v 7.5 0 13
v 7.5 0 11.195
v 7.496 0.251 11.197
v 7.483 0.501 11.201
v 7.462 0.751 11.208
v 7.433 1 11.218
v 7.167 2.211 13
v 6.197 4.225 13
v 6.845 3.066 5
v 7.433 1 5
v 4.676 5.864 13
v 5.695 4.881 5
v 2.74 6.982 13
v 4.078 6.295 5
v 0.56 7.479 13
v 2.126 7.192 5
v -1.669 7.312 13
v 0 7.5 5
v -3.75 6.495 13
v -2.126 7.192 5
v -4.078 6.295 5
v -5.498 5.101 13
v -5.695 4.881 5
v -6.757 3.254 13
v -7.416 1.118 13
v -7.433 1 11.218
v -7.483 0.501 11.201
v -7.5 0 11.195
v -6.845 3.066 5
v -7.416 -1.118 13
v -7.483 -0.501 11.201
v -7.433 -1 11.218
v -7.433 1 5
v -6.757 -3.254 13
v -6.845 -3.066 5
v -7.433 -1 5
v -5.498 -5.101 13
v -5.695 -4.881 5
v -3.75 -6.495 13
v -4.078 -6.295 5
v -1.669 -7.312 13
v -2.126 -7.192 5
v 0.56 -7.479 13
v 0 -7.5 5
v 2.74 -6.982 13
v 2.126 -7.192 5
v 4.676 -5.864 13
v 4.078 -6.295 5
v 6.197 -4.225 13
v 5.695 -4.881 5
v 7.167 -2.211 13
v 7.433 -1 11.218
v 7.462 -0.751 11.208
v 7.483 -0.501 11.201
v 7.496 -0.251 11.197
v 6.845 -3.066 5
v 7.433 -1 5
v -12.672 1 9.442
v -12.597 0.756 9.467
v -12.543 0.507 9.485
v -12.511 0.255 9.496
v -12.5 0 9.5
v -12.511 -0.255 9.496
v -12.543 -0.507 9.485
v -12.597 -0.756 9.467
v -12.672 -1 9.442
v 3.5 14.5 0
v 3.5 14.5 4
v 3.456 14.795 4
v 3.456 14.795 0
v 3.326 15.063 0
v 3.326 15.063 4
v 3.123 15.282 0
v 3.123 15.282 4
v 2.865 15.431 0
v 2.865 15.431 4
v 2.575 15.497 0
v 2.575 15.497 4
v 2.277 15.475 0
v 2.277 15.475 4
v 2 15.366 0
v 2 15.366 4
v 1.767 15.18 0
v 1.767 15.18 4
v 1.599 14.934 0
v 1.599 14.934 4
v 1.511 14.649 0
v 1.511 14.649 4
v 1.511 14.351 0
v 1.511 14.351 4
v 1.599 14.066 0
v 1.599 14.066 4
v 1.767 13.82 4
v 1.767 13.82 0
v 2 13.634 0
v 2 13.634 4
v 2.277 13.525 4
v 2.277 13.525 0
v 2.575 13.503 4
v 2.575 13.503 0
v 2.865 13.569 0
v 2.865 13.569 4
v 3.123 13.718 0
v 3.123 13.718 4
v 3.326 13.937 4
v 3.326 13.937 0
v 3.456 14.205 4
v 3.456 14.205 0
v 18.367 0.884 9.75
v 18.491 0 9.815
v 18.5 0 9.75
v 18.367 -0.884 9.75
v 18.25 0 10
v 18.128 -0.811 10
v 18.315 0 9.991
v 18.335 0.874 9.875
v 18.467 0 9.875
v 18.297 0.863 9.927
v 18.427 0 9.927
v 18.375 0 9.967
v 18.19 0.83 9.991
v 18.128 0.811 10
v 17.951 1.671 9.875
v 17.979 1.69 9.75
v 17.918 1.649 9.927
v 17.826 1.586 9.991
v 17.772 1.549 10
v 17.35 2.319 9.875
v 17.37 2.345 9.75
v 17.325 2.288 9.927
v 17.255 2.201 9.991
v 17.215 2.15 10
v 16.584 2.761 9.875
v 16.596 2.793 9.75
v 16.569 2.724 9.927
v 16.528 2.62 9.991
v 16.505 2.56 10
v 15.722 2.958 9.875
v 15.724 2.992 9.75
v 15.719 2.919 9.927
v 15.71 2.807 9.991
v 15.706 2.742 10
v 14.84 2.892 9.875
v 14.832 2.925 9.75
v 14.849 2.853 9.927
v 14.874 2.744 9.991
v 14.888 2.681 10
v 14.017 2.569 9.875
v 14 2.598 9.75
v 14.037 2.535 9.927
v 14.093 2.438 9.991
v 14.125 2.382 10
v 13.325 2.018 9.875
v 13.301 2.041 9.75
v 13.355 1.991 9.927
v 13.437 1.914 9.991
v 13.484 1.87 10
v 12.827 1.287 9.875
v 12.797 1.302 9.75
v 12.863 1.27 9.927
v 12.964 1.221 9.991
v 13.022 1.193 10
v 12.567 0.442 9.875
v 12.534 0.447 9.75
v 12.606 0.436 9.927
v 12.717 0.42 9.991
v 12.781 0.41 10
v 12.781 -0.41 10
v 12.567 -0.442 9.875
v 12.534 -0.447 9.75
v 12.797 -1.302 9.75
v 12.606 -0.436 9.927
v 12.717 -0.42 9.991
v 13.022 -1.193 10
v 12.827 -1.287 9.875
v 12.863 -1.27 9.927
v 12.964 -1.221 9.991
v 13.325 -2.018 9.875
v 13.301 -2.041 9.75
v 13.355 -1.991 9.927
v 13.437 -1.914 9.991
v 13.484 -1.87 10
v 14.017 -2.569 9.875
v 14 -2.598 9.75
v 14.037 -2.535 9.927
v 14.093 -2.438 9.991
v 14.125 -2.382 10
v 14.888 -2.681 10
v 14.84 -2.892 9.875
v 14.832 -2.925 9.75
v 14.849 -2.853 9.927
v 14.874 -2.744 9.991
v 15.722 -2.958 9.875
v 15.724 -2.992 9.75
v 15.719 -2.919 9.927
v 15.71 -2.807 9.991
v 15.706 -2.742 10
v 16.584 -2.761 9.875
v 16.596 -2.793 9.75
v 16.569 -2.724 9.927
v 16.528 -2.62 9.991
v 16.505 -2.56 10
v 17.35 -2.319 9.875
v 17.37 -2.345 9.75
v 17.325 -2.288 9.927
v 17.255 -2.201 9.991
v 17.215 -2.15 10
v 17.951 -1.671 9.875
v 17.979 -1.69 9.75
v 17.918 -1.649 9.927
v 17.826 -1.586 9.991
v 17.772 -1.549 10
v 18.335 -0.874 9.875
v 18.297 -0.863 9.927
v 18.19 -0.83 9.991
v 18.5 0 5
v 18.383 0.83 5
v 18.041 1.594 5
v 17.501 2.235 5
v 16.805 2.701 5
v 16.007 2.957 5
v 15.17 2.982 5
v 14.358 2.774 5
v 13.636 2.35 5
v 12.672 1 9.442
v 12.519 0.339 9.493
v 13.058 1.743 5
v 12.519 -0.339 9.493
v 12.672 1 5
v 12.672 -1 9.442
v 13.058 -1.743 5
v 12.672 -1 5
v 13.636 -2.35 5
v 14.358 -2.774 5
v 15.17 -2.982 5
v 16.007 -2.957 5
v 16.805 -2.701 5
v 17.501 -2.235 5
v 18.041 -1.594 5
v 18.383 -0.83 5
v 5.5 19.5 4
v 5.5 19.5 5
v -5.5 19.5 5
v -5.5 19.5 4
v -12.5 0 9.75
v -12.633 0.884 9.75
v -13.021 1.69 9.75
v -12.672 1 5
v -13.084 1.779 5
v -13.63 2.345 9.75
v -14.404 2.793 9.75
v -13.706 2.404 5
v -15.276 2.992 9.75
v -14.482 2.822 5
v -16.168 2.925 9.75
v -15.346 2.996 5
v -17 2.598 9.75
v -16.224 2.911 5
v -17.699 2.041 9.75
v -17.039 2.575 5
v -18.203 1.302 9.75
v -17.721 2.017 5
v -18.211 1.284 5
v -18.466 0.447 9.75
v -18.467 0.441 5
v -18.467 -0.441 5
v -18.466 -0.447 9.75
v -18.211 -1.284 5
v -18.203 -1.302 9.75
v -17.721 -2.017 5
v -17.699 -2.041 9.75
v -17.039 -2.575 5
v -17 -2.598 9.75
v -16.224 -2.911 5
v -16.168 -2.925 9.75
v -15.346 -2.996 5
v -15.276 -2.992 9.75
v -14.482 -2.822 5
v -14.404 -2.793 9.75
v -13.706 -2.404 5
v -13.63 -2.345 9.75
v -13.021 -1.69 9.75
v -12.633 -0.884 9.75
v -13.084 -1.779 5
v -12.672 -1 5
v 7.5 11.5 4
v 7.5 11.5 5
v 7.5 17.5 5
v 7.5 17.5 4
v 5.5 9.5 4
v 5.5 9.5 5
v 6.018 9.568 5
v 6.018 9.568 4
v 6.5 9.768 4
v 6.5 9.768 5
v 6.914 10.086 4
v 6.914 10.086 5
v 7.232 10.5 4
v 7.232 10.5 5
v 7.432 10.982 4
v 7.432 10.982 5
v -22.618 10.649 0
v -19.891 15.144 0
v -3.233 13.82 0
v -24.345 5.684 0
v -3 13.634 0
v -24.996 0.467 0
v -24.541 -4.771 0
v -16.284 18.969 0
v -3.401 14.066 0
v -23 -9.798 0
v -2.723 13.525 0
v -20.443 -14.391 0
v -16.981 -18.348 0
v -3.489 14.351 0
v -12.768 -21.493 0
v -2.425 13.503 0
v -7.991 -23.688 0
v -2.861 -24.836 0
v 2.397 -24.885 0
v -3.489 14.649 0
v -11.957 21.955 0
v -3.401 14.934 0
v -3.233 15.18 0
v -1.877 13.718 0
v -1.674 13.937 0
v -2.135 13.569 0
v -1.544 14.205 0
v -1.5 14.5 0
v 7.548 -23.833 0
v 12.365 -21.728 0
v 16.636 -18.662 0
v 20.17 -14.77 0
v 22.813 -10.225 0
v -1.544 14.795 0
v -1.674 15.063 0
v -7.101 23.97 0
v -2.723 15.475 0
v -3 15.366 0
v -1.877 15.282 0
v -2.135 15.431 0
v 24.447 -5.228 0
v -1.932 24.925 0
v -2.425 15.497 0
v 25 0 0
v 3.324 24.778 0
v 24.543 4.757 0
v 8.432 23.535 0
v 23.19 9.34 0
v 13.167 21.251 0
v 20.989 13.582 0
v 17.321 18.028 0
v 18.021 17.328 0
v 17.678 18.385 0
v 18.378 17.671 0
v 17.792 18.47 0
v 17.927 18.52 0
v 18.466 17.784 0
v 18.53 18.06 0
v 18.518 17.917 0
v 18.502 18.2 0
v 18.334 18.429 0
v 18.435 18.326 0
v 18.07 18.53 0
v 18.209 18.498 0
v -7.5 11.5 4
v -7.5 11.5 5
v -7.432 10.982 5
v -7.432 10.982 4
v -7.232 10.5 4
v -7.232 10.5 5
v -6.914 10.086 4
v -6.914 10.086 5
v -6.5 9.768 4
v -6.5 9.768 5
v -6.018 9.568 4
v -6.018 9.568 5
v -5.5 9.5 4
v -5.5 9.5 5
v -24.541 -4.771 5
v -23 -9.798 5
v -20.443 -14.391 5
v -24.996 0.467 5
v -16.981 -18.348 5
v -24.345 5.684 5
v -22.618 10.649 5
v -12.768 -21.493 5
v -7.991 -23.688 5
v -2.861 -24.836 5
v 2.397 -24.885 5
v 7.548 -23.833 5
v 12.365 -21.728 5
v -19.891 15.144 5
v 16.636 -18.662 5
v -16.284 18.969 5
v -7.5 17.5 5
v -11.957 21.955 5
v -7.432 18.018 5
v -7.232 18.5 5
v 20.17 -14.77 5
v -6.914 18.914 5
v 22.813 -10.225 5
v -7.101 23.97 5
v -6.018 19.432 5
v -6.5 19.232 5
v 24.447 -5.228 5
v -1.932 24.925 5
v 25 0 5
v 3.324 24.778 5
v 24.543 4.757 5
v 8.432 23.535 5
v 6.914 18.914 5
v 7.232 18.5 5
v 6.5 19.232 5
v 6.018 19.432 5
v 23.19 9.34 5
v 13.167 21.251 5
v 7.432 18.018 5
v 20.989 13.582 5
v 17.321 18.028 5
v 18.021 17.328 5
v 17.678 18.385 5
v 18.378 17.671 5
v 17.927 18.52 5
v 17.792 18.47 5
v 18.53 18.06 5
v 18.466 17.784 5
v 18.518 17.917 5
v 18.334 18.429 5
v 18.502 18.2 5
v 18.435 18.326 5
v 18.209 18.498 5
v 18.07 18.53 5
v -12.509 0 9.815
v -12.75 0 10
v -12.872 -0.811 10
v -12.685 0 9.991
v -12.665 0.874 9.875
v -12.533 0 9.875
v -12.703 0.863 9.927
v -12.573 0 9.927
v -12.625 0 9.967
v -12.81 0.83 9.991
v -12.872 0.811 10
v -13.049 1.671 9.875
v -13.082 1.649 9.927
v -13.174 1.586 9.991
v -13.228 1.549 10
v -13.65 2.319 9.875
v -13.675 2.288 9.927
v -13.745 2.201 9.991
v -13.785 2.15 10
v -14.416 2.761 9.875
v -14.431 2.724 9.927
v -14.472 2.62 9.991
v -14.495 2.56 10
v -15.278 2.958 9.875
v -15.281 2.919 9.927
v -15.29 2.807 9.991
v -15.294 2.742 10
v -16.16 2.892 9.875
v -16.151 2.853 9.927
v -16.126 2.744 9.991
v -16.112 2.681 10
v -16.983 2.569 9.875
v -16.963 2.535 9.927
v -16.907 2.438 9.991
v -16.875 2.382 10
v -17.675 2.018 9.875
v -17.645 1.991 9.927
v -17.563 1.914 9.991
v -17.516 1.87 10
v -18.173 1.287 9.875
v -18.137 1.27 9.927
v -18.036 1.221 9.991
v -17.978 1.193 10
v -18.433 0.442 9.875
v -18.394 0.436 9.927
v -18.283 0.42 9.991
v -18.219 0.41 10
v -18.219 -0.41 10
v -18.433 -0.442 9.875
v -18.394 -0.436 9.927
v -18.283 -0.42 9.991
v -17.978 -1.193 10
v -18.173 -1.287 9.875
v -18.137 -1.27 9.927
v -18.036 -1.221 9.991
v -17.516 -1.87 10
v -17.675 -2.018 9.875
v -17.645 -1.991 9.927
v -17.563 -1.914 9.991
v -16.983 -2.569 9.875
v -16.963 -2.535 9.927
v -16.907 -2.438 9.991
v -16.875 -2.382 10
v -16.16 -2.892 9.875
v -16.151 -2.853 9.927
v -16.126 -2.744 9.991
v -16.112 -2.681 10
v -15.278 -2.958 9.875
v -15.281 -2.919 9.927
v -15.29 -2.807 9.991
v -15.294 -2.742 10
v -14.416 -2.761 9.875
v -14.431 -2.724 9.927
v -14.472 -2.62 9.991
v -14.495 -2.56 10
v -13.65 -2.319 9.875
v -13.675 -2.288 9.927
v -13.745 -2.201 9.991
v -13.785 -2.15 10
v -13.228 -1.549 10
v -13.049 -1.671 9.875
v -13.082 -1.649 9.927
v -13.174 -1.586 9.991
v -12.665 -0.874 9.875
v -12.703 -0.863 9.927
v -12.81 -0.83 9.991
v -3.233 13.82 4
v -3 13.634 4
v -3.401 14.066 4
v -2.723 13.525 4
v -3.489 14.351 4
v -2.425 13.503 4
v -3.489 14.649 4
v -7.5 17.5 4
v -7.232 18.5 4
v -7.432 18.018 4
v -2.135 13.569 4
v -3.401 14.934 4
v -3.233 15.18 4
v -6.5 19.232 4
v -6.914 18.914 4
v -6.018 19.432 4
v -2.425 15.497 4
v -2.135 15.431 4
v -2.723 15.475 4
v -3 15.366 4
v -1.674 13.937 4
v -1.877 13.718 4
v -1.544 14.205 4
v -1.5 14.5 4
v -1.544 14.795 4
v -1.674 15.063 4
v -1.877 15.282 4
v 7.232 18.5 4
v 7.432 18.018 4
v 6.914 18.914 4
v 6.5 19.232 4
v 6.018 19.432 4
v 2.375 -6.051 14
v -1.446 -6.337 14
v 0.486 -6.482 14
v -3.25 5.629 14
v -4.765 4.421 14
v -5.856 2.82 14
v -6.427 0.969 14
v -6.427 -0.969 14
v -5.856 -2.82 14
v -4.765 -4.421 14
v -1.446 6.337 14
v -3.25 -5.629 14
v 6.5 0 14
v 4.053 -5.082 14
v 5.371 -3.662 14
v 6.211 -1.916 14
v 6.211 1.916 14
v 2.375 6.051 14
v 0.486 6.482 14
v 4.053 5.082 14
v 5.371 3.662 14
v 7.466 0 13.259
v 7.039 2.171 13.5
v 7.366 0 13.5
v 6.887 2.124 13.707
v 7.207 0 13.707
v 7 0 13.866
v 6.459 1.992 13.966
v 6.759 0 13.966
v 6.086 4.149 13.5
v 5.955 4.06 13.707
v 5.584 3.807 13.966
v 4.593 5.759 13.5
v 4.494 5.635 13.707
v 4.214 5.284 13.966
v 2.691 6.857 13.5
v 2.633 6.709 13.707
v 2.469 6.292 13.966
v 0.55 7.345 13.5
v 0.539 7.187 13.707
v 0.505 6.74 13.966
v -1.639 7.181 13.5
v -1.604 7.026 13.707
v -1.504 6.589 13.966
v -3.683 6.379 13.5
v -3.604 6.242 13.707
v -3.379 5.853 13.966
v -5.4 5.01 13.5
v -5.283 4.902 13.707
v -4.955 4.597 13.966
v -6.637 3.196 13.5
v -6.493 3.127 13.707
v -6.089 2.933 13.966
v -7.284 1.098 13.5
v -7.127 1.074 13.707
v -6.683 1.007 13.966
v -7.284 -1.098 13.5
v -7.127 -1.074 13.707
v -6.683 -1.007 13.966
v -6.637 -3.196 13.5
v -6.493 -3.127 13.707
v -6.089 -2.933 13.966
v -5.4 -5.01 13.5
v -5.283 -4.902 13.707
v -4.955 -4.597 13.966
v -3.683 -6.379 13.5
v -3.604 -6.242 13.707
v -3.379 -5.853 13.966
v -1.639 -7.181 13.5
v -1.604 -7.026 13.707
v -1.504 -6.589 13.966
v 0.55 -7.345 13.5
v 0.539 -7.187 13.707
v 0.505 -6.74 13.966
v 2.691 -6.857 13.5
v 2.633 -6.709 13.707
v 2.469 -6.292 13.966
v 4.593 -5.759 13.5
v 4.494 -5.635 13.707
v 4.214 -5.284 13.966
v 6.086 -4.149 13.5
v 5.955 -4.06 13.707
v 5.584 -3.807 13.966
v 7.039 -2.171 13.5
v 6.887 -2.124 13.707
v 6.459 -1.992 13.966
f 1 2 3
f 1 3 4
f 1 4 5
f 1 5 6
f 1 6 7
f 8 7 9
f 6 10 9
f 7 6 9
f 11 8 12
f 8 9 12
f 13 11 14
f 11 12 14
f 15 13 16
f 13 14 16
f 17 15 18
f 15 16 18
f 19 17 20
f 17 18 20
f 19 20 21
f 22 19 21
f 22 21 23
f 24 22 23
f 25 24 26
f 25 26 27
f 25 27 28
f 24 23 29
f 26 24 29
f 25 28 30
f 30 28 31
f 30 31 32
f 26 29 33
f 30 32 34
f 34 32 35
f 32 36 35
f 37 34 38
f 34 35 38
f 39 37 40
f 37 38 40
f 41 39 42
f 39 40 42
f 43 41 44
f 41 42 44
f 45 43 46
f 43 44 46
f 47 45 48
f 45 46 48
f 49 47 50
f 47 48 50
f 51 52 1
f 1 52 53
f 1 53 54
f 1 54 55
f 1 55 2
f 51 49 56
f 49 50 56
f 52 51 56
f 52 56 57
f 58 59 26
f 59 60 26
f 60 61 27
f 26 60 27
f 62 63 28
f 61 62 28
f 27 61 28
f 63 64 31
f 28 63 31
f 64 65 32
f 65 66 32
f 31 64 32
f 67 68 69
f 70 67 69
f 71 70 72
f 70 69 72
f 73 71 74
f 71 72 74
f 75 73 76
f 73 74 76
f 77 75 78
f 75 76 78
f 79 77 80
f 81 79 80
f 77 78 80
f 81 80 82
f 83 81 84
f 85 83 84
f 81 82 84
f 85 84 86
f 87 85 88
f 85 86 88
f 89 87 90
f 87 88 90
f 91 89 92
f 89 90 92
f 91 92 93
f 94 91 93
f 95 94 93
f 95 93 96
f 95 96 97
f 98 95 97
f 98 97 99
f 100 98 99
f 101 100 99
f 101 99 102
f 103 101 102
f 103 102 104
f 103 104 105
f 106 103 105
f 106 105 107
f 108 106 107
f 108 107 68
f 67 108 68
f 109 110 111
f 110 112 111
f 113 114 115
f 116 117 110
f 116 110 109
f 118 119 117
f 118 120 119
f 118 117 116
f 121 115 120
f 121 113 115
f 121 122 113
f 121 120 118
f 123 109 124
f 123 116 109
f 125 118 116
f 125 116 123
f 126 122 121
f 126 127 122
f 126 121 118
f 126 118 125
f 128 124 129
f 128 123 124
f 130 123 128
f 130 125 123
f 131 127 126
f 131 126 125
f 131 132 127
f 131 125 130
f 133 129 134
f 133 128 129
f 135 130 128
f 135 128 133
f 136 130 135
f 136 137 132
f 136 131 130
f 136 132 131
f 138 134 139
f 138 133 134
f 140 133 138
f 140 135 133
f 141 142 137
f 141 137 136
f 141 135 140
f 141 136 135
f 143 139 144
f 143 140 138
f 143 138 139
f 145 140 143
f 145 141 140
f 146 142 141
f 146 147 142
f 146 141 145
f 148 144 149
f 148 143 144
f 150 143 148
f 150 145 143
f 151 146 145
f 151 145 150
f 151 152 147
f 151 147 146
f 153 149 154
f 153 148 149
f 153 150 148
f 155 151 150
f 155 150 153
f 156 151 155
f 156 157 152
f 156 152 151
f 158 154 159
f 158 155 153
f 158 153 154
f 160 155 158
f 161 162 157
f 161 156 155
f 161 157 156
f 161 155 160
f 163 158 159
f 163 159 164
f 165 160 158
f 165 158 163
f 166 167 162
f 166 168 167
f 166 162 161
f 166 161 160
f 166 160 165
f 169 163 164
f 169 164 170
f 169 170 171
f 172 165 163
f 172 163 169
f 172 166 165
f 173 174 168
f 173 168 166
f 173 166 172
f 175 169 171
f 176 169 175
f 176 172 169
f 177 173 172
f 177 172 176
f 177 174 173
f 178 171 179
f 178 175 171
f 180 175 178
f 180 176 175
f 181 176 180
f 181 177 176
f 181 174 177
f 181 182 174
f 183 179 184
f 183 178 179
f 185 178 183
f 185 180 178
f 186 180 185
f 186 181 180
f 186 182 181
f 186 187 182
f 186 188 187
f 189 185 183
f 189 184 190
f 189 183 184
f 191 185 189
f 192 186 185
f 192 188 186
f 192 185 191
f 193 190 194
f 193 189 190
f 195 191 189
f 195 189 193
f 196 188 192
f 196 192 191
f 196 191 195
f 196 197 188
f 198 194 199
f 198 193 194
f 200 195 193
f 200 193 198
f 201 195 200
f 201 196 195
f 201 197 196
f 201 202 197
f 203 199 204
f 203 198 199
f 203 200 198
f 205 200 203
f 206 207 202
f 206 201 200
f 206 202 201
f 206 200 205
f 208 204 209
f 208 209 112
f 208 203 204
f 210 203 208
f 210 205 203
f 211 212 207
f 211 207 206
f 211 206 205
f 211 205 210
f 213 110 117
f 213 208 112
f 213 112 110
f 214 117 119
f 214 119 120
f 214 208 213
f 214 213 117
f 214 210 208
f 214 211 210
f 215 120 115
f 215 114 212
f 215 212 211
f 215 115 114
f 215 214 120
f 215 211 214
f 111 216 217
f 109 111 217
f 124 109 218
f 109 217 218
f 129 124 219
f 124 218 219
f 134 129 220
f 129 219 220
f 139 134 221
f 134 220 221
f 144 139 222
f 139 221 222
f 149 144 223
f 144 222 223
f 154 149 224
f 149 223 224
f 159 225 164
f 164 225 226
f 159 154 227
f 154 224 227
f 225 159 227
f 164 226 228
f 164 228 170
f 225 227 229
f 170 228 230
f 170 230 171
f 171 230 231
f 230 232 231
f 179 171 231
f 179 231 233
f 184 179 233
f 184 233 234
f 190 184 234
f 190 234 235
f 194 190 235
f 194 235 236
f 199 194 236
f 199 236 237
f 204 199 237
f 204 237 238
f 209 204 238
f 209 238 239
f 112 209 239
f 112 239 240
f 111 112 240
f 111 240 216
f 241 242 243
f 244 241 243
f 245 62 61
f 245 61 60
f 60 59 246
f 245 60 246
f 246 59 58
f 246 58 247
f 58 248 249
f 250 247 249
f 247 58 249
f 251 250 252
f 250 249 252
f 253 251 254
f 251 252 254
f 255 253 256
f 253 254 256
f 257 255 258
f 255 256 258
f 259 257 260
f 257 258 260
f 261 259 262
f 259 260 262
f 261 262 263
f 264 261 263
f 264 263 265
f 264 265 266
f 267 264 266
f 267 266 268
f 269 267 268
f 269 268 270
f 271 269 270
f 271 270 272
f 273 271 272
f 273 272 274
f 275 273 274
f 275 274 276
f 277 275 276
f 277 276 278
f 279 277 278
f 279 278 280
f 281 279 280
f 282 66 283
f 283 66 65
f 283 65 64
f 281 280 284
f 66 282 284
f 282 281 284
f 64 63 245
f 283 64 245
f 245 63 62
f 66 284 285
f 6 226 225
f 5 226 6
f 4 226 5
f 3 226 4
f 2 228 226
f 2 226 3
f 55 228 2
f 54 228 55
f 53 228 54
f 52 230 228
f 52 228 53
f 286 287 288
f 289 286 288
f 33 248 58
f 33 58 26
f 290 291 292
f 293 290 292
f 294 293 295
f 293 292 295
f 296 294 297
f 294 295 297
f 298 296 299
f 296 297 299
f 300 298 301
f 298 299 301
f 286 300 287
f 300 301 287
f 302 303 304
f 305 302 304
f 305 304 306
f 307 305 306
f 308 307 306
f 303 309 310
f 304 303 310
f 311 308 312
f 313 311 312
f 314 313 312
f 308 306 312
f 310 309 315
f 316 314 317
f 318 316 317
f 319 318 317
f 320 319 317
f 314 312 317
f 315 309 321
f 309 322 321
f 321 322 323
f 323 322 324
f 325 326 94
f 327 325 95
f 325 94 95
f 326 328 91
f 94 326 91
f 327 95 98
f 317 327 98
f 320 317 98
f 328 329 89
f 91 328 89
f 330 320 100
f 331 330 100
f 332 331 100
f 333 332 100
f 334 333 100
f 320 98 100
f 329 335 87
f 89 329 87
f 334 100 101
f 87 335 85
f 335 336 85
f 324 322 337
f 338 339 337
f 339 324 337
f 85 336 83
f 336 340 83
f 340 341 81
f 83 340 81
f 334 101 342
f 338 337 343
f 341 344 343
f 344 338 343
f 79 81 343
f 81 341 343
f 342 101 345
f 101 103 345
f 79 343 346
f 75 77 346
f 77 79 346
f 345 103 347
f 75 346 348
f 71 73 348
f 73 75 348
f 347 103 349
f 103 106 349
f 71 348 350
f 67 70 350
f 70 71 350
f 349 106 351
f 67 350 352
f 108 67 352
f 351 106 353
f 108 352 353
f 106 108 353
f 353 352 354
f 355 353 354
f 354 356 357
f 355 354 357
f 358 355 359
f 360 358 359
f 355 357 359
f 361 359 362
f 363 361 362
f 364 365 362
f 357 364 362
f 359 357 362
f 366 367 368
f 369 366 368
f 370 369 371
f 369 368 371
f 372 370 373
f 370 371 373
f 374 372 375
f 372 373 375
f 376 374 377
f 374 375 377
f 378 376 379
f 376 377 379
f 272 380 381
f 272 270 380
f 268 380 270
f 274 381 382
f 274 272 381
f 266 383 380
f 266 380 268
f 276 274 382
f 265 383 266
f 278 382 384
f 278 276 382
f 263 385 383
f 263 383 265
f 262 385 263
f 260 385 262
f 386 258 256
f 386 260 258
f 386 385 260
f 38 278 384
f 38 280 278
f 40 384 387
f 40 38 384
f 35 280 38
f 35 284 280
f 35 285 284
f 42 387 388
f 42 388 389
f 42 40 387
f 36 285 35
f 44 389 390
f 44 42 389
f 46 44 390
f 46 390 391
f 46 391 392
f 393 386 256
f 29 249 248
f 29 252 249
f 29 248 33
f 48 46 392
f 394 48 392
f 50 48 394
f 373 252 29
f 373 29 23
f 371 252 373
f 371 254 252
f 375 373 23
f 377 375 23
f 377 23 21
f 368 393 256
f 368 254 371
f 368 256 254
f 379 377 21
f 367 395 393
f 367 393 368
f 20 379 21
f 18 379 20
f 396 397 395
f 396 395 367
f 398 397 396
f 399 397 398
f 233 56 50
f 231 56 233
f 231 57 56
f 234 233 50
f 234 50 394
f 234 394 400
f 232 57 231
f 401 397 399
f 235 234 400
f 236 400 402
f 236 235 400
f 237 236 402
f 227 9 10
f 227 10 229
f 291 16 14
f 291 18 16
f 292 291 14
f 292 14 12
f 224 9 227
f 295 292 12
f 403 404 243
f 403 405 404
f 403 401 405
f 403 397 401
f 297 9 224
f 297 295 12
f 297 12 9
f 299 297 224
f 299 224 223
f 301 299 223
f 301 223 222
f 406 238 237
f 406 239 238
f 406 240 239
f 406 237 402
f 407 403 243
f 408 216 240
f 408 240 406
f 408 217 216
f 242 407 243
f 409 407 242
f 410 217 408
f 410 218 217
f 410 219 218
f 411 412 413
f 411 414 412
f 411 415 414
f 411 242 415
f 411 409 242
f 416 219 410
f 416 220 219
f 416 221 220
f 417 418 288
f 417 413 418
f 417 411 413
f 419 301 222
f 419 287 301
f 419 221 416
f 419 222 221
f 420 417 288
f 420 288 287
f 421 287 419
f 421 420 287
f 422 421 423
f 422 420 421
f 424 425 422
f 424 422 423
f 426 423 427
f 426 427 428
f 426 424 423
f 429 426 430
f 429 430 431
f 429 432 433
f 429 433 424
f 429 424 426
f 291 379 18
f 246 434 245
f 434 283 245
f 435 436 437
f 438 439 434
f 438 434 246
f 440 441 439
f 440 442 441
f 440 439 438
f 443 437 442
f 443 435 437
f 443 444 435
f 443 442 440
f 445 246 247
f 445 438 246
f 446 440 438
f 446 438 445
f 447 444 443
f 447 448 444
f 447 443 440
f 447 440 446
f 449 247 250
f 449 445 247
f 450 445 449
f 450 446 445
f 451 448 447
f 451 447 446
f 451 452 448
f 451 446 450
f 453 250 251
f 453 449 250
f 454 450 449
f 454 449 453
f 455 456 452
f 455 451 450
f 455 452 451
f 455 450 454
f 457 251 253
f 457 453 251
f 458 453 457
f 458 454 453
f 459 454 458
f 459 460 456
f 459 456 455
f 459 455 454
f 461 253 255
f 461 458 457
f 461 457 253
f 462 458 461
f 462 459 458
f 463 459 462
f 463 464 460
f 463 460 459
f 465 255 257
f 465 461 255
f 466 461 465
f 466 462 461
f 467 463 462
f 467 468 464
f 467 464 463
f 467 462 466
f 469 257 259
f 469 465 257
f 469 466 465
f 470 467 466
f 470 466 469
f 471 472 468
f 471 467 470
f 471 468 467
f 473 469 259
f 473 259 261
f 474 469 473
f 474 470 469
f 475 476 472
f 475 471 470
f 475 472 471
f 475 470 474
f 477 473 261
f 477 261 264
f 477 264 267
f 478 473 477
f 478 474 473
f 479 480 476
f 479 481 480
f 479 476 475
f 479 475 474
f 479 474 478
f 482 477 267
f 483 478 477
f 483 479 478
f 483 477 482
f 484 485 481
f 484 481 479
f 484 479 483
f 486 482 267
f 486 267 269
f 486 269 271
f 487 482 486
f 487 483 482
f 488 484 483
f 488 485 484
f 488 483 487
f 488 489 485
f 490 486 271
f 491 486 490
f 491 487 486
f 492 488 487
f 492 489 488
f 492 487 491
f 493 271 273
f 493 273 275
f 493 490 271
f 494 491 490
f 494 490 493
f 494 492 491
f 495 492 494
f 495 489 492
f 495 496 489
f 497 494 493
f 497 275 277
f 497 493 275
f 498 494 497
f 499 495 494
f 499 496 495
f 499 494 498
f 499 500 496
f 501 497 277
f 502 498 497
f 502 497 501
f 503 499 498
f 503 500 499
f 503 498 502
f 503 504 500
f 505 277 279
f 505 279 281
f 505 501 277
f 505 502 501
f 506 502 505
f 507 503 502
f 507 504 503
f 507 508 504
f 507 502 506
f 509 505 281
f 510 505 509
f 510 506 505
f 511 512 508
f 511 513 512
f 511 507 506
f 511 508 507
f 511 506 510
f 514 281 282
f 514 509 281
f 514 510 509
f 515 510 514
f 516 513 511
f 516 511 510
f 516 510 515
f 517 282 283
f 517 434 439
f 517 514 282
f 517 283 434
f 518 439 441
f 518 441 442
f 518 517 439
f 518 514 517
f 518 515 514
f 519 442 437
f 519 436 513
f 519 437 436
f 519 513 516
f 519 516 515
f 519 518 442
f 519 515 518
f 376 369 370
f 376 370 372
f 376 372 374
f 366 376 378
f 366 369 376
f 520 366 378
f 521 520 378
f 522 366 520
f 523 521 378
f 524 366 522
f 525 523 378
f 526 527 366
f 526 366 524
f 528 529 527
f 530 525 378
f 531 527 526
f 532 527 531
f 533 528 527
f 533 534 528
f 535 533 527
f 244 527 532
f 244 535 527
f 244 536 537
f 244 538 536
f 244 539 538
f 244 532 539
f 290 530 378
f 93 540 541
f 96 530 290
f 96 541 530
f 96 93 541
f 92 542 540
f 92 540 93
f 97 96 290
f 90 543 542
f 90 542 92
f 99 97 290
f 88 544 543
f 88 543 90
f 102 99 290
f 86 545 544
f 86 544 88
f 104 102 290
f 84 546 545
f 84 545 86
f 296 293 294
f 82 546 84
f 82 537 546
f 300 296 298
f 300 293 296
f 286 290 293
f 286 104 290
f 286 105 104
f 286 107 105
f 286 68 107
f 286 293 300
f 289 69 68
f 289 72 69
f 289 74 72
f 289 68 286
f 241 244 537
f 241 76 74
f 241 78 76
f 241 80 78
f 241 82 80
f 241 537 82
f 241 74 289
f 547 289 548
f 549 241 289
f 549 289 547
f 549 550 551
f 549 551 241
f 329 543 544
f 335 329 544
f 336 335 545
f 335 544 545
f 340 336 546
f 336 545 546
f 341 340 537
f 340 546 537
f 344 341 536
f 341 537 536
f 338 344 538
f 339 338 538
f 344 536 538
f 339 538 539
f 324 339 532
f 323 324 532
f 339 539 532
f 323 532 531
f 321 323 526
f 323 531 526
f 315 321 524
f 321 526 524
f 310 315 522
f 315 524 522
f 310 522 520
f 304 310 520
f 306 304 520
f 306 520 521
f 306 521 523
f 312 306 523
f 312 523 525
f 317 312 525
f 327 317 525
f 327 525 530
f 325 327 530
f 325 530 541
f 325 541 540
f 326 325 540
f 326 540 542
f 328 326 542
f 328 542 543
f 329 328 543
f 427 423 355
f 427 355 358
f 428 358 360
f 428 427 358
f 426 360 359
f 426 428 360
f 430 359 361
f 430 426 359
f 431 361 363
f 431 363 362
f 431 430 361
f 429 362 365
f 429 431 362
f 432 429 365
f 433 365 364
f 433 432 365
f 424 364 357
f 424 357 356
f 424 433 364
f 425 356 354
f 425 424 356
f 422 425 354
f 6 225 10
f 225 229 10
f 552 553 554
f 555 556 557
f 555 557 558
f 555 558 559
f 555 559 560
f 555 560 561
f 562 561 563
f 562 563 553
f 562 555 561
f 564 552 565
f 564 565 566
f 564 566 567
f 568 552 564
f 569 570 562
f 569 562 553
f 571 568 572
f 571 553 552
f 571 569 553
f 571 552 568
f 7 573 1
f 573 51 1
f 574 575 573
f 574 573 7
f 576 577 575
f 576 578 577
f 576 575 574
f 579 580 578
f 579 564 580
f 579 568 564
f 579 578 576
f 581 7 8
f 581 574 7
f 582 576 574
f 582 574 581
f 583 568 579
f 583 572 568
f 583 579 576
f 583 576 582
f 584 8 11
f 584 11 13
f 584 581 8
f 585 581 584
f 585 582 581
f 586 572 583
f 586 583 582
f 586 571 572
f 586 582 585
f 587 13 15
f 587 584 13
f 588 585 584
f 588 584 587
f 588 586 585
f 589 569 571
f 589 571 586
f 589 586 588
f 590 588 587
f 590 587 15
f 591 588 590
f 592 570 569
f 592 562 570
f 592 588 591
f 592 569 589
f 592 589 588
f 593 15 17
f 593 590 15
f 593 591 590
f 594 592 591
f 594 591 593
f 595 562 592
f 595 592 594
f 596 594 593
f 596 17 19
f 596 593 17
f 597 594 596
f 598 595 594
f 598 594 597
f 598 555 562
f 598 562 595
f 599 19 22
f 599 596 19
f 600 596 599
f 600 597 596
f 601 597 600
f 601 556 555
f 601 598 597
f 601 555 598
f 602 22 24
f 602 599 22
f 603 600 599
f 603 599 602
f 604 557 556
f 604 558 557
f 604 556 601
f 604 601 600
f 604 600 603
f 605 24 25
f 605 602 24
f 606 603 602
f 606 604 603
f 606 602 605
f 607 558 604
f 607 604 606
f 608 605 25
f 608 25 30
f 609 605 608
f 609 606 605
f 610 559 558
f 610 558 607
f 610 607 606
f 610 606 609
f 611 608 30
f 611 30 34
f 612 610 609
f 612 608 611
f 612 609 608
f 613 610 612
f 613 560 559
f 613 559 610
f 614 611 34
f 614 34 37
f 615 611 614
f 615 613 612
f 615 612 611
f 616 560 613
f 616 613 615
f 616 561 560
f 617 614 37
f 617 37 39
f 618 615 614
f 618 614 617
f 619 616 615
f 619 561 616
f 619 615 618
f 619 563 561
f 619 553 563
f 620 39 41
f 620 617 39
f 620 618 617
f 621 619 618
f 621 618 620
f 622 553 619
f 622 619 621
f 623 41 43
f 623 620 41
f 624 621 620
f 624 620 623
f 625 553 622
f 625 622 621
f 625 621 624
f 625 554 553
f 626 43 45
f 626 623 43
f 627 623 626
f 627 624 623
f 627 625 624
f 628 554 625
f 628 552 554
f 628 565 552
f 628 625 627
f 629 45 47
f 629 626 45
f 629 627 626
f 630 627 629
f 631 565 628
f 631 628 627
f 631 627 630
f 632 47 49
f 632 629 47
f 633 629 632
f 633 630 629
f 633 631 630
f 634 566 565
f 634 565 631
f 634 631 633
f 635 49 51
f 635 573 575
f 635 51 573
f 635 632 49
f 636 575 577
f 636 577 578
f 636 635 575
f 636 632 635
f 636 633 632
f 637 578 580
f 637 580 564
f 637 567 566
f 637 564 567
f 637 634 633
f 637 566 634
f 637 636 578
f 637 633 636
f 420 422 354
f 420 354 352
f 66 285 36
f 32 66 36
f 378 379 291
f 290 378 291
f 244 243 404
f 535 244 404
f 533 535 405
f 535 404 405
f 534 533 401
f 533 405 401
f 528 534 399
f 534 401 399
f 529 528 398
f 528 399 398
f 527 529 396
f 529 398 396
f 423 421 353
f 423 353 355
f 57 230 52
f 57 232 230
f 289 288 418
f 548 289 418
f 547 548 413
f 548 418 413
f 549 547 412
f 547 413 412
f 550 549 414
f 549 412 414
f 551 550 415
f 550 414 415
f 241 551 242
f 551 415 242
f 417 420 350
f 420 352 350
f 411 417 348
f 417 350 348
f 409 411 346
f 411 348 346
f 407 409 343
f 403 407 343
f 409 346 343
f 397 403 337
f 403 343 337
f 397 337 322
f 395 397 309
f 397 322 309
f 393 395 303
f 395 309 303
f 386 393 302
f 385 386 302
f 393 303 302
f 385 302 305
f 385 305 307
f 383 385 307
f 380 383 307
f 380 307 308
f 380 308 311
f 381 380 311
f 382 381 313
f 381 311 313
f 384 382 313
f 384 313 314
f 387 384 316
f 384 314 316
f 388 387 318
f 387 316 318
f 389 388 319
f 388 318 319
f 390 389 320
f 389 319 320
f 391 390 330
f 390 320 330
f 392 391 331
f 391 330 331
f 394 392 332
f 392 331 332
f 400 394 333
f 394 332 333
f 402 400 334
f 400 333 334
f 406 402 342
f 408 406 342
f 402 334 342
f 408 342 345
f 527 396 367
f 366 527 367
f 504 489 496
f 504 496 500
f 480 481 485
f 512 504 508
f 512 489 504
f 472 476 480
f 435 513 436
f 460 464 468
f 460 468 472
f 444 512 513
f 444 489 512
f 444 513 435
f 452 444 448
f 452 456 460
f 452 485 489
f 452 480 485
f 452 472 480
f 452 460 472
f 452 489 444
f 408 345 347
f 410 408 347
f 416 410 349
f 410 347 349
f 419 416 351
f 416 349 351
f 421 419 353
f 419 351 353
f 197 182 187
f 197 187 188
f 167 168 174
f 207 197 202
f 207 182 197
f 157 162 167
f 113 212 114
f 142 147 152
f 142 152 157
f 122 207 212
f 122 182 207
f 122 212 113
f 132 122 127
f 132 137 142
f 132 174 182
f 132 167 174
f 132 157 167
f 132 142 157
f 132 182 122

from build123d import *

# Parameters (mm, degrees)
SKETCH_1_R           = 25
EXTRUDE_1_DEPTH      = 5
SKETCH_2_R           = 7.5
EXTRUDE_2_DEPTH      = 9
SKETCH_3_R           = 3
EXTRUDE_3_DEPTH      = 5
FILLET_1_R           = 1
EXTRUDE_4_DEPTH      = 1
EXTRUDE_4_DEPTH_BACK = 1
FILLET_2_R           = 0.25
EXTRUDE_5_DEPTH      = 5
CUT_EXTRUDE_1_DEPTH  = 1
SKETCH_7_R           = 1
CUT_EXTRUDE_2_DEPTH  = 21


with BuildPart() as part:
    # Эскиз1 → Бобышка-Вытянуть1 (new body)
    with BuildSketch(Plane.XY):
        Circle(SKETCH_1_R)
    extrude(amount=EXTRUDE_1_DEPTH)

    # Эскиз2 → Бобышка-Вытянуть2 (add)
    with BuildSketch(Plane.XY.offset(5)):
        Circle(SKETCH_2_R)
    extrude(amount=EXTRUDE_2_DEPTH)

    # Эскиз3 → Бобышка-Вытянуть3 (add)
    with BuildSketch(Plane.XY.offset(5)):
        with Locations((15.5, 0)):
            Circle(SKETCH_3_R)
        with Locations((-15.5, 0)):
            Circle(SKETCH_3_R)
    extrude(amount=EXTRUDE_3_DEPTH)

    # Скругление1
    fillet_1_edges = [part.edges().sort_by_distance(p)[0] for p in [
        (-7.5, 0, 14),
    ]]
    fillet(fillet_1_edges, radius=FILLET_1_R)

    # Эскиз4 → Бобышка-Вытянуть4 (add, two sides: drawn at the far end of the back side and taken through both)
    with BuildSketch(Plane(origin=(0, 0, 0), x_dir=(1, 0, 0), z_dir=(0, 1, 0)).offset(-EXTRUDE_4_DEPTH_BACK)):
        Polygon((-15.889303471, -8.350739368), (-5.011906667, -12.039097177), (-5.011906667, -5), (-15.889303471, -5), align=None)
        Polygon((5.011906667, -12.039097177), (5.011906667, -5), (15.889303471, -5), (15.889303471, -8.350739368), align=None)
    extrude(amount=EXTRUDE_4_DEPTH + EXTRUDE_4_DEPTH_BACK)

    # Скругление2
    fillet_2_edges = [part.edges().sort_by_distance(p)[0] for p in [
        (-18.5, 0, 10),
        (12.5, 0, 10),
    ]]
    fillet(fillet_2_edges, radius=FILLET_2_R)

    # Эскиз5 → Бобышка-Вытянуть5 (add)
    with BuildSketch(Plane.XY.offset(5)):
        with BuildLine():
            Line((17.67766953, 18.384776311), (17.015216986, 17.722323767))
            Line((17.015216986, 17.722323767), (17.709176341, 17.028364412))
            Line((17.709176341, 17.028364412), (18.377652971, 17.670686903))
            ThreePointArc((18.377652971, 17.670686903), (18.388285388, 18.381232054), (17.67766953, 18.384776311))
        make_face()
    extrude(amount=-EXTRUDE_5_DEPTH)

    # Эскиз6 → Вырез-Вытянуть1 (cut)
    with BuildSketch(Plane.XY.offset(5)):
        with BuildLine():
            Line((-5.5, 9.5), (5.5, 9.5))
            ThreePointArc((5.5, 9.5), (6.914213562, 10.085786438), (7.5, 11.5))
            Line((7.5, 11.5), (7.5, 17.5))
            ThreePointArc((7.5, 17.5), (6.914213562, 18.914213562), (5.5, 19.5))
            Line((5.5, 19.5), (-5.5, 19.5))
            ThreePointArc((-5.5, 19.5), (-6.914213562, 18.914213562), (-7.5, 17.5))
            Line((-7.5, 17.5), (-7.5, 11.5))
            ThreePointArc((-7.5, 11.5), (-6.914213562, 10.085786438), (-5.5, 9.5))
        make_face()
    extrude(amount=-CUT_EXTRUDE_1_DEPTH, mode=Mode.SUBTRACT)

    # Эскиз7 → Вырез-Вытянуть2 (cut)
    with BuildSketch(Plane.XY.offset(4)):
        with Locations((-2.5, 14.5)):
            Circle(SKETCH_7_R)
        with Locations((2.5, 14.5)):
            Circle(SKETCH_7_R)
    extrude(amount=-CUT_EXTRUDE_2_DEPTH, mode=Mode.SUBTRACT)


solid = part.part
